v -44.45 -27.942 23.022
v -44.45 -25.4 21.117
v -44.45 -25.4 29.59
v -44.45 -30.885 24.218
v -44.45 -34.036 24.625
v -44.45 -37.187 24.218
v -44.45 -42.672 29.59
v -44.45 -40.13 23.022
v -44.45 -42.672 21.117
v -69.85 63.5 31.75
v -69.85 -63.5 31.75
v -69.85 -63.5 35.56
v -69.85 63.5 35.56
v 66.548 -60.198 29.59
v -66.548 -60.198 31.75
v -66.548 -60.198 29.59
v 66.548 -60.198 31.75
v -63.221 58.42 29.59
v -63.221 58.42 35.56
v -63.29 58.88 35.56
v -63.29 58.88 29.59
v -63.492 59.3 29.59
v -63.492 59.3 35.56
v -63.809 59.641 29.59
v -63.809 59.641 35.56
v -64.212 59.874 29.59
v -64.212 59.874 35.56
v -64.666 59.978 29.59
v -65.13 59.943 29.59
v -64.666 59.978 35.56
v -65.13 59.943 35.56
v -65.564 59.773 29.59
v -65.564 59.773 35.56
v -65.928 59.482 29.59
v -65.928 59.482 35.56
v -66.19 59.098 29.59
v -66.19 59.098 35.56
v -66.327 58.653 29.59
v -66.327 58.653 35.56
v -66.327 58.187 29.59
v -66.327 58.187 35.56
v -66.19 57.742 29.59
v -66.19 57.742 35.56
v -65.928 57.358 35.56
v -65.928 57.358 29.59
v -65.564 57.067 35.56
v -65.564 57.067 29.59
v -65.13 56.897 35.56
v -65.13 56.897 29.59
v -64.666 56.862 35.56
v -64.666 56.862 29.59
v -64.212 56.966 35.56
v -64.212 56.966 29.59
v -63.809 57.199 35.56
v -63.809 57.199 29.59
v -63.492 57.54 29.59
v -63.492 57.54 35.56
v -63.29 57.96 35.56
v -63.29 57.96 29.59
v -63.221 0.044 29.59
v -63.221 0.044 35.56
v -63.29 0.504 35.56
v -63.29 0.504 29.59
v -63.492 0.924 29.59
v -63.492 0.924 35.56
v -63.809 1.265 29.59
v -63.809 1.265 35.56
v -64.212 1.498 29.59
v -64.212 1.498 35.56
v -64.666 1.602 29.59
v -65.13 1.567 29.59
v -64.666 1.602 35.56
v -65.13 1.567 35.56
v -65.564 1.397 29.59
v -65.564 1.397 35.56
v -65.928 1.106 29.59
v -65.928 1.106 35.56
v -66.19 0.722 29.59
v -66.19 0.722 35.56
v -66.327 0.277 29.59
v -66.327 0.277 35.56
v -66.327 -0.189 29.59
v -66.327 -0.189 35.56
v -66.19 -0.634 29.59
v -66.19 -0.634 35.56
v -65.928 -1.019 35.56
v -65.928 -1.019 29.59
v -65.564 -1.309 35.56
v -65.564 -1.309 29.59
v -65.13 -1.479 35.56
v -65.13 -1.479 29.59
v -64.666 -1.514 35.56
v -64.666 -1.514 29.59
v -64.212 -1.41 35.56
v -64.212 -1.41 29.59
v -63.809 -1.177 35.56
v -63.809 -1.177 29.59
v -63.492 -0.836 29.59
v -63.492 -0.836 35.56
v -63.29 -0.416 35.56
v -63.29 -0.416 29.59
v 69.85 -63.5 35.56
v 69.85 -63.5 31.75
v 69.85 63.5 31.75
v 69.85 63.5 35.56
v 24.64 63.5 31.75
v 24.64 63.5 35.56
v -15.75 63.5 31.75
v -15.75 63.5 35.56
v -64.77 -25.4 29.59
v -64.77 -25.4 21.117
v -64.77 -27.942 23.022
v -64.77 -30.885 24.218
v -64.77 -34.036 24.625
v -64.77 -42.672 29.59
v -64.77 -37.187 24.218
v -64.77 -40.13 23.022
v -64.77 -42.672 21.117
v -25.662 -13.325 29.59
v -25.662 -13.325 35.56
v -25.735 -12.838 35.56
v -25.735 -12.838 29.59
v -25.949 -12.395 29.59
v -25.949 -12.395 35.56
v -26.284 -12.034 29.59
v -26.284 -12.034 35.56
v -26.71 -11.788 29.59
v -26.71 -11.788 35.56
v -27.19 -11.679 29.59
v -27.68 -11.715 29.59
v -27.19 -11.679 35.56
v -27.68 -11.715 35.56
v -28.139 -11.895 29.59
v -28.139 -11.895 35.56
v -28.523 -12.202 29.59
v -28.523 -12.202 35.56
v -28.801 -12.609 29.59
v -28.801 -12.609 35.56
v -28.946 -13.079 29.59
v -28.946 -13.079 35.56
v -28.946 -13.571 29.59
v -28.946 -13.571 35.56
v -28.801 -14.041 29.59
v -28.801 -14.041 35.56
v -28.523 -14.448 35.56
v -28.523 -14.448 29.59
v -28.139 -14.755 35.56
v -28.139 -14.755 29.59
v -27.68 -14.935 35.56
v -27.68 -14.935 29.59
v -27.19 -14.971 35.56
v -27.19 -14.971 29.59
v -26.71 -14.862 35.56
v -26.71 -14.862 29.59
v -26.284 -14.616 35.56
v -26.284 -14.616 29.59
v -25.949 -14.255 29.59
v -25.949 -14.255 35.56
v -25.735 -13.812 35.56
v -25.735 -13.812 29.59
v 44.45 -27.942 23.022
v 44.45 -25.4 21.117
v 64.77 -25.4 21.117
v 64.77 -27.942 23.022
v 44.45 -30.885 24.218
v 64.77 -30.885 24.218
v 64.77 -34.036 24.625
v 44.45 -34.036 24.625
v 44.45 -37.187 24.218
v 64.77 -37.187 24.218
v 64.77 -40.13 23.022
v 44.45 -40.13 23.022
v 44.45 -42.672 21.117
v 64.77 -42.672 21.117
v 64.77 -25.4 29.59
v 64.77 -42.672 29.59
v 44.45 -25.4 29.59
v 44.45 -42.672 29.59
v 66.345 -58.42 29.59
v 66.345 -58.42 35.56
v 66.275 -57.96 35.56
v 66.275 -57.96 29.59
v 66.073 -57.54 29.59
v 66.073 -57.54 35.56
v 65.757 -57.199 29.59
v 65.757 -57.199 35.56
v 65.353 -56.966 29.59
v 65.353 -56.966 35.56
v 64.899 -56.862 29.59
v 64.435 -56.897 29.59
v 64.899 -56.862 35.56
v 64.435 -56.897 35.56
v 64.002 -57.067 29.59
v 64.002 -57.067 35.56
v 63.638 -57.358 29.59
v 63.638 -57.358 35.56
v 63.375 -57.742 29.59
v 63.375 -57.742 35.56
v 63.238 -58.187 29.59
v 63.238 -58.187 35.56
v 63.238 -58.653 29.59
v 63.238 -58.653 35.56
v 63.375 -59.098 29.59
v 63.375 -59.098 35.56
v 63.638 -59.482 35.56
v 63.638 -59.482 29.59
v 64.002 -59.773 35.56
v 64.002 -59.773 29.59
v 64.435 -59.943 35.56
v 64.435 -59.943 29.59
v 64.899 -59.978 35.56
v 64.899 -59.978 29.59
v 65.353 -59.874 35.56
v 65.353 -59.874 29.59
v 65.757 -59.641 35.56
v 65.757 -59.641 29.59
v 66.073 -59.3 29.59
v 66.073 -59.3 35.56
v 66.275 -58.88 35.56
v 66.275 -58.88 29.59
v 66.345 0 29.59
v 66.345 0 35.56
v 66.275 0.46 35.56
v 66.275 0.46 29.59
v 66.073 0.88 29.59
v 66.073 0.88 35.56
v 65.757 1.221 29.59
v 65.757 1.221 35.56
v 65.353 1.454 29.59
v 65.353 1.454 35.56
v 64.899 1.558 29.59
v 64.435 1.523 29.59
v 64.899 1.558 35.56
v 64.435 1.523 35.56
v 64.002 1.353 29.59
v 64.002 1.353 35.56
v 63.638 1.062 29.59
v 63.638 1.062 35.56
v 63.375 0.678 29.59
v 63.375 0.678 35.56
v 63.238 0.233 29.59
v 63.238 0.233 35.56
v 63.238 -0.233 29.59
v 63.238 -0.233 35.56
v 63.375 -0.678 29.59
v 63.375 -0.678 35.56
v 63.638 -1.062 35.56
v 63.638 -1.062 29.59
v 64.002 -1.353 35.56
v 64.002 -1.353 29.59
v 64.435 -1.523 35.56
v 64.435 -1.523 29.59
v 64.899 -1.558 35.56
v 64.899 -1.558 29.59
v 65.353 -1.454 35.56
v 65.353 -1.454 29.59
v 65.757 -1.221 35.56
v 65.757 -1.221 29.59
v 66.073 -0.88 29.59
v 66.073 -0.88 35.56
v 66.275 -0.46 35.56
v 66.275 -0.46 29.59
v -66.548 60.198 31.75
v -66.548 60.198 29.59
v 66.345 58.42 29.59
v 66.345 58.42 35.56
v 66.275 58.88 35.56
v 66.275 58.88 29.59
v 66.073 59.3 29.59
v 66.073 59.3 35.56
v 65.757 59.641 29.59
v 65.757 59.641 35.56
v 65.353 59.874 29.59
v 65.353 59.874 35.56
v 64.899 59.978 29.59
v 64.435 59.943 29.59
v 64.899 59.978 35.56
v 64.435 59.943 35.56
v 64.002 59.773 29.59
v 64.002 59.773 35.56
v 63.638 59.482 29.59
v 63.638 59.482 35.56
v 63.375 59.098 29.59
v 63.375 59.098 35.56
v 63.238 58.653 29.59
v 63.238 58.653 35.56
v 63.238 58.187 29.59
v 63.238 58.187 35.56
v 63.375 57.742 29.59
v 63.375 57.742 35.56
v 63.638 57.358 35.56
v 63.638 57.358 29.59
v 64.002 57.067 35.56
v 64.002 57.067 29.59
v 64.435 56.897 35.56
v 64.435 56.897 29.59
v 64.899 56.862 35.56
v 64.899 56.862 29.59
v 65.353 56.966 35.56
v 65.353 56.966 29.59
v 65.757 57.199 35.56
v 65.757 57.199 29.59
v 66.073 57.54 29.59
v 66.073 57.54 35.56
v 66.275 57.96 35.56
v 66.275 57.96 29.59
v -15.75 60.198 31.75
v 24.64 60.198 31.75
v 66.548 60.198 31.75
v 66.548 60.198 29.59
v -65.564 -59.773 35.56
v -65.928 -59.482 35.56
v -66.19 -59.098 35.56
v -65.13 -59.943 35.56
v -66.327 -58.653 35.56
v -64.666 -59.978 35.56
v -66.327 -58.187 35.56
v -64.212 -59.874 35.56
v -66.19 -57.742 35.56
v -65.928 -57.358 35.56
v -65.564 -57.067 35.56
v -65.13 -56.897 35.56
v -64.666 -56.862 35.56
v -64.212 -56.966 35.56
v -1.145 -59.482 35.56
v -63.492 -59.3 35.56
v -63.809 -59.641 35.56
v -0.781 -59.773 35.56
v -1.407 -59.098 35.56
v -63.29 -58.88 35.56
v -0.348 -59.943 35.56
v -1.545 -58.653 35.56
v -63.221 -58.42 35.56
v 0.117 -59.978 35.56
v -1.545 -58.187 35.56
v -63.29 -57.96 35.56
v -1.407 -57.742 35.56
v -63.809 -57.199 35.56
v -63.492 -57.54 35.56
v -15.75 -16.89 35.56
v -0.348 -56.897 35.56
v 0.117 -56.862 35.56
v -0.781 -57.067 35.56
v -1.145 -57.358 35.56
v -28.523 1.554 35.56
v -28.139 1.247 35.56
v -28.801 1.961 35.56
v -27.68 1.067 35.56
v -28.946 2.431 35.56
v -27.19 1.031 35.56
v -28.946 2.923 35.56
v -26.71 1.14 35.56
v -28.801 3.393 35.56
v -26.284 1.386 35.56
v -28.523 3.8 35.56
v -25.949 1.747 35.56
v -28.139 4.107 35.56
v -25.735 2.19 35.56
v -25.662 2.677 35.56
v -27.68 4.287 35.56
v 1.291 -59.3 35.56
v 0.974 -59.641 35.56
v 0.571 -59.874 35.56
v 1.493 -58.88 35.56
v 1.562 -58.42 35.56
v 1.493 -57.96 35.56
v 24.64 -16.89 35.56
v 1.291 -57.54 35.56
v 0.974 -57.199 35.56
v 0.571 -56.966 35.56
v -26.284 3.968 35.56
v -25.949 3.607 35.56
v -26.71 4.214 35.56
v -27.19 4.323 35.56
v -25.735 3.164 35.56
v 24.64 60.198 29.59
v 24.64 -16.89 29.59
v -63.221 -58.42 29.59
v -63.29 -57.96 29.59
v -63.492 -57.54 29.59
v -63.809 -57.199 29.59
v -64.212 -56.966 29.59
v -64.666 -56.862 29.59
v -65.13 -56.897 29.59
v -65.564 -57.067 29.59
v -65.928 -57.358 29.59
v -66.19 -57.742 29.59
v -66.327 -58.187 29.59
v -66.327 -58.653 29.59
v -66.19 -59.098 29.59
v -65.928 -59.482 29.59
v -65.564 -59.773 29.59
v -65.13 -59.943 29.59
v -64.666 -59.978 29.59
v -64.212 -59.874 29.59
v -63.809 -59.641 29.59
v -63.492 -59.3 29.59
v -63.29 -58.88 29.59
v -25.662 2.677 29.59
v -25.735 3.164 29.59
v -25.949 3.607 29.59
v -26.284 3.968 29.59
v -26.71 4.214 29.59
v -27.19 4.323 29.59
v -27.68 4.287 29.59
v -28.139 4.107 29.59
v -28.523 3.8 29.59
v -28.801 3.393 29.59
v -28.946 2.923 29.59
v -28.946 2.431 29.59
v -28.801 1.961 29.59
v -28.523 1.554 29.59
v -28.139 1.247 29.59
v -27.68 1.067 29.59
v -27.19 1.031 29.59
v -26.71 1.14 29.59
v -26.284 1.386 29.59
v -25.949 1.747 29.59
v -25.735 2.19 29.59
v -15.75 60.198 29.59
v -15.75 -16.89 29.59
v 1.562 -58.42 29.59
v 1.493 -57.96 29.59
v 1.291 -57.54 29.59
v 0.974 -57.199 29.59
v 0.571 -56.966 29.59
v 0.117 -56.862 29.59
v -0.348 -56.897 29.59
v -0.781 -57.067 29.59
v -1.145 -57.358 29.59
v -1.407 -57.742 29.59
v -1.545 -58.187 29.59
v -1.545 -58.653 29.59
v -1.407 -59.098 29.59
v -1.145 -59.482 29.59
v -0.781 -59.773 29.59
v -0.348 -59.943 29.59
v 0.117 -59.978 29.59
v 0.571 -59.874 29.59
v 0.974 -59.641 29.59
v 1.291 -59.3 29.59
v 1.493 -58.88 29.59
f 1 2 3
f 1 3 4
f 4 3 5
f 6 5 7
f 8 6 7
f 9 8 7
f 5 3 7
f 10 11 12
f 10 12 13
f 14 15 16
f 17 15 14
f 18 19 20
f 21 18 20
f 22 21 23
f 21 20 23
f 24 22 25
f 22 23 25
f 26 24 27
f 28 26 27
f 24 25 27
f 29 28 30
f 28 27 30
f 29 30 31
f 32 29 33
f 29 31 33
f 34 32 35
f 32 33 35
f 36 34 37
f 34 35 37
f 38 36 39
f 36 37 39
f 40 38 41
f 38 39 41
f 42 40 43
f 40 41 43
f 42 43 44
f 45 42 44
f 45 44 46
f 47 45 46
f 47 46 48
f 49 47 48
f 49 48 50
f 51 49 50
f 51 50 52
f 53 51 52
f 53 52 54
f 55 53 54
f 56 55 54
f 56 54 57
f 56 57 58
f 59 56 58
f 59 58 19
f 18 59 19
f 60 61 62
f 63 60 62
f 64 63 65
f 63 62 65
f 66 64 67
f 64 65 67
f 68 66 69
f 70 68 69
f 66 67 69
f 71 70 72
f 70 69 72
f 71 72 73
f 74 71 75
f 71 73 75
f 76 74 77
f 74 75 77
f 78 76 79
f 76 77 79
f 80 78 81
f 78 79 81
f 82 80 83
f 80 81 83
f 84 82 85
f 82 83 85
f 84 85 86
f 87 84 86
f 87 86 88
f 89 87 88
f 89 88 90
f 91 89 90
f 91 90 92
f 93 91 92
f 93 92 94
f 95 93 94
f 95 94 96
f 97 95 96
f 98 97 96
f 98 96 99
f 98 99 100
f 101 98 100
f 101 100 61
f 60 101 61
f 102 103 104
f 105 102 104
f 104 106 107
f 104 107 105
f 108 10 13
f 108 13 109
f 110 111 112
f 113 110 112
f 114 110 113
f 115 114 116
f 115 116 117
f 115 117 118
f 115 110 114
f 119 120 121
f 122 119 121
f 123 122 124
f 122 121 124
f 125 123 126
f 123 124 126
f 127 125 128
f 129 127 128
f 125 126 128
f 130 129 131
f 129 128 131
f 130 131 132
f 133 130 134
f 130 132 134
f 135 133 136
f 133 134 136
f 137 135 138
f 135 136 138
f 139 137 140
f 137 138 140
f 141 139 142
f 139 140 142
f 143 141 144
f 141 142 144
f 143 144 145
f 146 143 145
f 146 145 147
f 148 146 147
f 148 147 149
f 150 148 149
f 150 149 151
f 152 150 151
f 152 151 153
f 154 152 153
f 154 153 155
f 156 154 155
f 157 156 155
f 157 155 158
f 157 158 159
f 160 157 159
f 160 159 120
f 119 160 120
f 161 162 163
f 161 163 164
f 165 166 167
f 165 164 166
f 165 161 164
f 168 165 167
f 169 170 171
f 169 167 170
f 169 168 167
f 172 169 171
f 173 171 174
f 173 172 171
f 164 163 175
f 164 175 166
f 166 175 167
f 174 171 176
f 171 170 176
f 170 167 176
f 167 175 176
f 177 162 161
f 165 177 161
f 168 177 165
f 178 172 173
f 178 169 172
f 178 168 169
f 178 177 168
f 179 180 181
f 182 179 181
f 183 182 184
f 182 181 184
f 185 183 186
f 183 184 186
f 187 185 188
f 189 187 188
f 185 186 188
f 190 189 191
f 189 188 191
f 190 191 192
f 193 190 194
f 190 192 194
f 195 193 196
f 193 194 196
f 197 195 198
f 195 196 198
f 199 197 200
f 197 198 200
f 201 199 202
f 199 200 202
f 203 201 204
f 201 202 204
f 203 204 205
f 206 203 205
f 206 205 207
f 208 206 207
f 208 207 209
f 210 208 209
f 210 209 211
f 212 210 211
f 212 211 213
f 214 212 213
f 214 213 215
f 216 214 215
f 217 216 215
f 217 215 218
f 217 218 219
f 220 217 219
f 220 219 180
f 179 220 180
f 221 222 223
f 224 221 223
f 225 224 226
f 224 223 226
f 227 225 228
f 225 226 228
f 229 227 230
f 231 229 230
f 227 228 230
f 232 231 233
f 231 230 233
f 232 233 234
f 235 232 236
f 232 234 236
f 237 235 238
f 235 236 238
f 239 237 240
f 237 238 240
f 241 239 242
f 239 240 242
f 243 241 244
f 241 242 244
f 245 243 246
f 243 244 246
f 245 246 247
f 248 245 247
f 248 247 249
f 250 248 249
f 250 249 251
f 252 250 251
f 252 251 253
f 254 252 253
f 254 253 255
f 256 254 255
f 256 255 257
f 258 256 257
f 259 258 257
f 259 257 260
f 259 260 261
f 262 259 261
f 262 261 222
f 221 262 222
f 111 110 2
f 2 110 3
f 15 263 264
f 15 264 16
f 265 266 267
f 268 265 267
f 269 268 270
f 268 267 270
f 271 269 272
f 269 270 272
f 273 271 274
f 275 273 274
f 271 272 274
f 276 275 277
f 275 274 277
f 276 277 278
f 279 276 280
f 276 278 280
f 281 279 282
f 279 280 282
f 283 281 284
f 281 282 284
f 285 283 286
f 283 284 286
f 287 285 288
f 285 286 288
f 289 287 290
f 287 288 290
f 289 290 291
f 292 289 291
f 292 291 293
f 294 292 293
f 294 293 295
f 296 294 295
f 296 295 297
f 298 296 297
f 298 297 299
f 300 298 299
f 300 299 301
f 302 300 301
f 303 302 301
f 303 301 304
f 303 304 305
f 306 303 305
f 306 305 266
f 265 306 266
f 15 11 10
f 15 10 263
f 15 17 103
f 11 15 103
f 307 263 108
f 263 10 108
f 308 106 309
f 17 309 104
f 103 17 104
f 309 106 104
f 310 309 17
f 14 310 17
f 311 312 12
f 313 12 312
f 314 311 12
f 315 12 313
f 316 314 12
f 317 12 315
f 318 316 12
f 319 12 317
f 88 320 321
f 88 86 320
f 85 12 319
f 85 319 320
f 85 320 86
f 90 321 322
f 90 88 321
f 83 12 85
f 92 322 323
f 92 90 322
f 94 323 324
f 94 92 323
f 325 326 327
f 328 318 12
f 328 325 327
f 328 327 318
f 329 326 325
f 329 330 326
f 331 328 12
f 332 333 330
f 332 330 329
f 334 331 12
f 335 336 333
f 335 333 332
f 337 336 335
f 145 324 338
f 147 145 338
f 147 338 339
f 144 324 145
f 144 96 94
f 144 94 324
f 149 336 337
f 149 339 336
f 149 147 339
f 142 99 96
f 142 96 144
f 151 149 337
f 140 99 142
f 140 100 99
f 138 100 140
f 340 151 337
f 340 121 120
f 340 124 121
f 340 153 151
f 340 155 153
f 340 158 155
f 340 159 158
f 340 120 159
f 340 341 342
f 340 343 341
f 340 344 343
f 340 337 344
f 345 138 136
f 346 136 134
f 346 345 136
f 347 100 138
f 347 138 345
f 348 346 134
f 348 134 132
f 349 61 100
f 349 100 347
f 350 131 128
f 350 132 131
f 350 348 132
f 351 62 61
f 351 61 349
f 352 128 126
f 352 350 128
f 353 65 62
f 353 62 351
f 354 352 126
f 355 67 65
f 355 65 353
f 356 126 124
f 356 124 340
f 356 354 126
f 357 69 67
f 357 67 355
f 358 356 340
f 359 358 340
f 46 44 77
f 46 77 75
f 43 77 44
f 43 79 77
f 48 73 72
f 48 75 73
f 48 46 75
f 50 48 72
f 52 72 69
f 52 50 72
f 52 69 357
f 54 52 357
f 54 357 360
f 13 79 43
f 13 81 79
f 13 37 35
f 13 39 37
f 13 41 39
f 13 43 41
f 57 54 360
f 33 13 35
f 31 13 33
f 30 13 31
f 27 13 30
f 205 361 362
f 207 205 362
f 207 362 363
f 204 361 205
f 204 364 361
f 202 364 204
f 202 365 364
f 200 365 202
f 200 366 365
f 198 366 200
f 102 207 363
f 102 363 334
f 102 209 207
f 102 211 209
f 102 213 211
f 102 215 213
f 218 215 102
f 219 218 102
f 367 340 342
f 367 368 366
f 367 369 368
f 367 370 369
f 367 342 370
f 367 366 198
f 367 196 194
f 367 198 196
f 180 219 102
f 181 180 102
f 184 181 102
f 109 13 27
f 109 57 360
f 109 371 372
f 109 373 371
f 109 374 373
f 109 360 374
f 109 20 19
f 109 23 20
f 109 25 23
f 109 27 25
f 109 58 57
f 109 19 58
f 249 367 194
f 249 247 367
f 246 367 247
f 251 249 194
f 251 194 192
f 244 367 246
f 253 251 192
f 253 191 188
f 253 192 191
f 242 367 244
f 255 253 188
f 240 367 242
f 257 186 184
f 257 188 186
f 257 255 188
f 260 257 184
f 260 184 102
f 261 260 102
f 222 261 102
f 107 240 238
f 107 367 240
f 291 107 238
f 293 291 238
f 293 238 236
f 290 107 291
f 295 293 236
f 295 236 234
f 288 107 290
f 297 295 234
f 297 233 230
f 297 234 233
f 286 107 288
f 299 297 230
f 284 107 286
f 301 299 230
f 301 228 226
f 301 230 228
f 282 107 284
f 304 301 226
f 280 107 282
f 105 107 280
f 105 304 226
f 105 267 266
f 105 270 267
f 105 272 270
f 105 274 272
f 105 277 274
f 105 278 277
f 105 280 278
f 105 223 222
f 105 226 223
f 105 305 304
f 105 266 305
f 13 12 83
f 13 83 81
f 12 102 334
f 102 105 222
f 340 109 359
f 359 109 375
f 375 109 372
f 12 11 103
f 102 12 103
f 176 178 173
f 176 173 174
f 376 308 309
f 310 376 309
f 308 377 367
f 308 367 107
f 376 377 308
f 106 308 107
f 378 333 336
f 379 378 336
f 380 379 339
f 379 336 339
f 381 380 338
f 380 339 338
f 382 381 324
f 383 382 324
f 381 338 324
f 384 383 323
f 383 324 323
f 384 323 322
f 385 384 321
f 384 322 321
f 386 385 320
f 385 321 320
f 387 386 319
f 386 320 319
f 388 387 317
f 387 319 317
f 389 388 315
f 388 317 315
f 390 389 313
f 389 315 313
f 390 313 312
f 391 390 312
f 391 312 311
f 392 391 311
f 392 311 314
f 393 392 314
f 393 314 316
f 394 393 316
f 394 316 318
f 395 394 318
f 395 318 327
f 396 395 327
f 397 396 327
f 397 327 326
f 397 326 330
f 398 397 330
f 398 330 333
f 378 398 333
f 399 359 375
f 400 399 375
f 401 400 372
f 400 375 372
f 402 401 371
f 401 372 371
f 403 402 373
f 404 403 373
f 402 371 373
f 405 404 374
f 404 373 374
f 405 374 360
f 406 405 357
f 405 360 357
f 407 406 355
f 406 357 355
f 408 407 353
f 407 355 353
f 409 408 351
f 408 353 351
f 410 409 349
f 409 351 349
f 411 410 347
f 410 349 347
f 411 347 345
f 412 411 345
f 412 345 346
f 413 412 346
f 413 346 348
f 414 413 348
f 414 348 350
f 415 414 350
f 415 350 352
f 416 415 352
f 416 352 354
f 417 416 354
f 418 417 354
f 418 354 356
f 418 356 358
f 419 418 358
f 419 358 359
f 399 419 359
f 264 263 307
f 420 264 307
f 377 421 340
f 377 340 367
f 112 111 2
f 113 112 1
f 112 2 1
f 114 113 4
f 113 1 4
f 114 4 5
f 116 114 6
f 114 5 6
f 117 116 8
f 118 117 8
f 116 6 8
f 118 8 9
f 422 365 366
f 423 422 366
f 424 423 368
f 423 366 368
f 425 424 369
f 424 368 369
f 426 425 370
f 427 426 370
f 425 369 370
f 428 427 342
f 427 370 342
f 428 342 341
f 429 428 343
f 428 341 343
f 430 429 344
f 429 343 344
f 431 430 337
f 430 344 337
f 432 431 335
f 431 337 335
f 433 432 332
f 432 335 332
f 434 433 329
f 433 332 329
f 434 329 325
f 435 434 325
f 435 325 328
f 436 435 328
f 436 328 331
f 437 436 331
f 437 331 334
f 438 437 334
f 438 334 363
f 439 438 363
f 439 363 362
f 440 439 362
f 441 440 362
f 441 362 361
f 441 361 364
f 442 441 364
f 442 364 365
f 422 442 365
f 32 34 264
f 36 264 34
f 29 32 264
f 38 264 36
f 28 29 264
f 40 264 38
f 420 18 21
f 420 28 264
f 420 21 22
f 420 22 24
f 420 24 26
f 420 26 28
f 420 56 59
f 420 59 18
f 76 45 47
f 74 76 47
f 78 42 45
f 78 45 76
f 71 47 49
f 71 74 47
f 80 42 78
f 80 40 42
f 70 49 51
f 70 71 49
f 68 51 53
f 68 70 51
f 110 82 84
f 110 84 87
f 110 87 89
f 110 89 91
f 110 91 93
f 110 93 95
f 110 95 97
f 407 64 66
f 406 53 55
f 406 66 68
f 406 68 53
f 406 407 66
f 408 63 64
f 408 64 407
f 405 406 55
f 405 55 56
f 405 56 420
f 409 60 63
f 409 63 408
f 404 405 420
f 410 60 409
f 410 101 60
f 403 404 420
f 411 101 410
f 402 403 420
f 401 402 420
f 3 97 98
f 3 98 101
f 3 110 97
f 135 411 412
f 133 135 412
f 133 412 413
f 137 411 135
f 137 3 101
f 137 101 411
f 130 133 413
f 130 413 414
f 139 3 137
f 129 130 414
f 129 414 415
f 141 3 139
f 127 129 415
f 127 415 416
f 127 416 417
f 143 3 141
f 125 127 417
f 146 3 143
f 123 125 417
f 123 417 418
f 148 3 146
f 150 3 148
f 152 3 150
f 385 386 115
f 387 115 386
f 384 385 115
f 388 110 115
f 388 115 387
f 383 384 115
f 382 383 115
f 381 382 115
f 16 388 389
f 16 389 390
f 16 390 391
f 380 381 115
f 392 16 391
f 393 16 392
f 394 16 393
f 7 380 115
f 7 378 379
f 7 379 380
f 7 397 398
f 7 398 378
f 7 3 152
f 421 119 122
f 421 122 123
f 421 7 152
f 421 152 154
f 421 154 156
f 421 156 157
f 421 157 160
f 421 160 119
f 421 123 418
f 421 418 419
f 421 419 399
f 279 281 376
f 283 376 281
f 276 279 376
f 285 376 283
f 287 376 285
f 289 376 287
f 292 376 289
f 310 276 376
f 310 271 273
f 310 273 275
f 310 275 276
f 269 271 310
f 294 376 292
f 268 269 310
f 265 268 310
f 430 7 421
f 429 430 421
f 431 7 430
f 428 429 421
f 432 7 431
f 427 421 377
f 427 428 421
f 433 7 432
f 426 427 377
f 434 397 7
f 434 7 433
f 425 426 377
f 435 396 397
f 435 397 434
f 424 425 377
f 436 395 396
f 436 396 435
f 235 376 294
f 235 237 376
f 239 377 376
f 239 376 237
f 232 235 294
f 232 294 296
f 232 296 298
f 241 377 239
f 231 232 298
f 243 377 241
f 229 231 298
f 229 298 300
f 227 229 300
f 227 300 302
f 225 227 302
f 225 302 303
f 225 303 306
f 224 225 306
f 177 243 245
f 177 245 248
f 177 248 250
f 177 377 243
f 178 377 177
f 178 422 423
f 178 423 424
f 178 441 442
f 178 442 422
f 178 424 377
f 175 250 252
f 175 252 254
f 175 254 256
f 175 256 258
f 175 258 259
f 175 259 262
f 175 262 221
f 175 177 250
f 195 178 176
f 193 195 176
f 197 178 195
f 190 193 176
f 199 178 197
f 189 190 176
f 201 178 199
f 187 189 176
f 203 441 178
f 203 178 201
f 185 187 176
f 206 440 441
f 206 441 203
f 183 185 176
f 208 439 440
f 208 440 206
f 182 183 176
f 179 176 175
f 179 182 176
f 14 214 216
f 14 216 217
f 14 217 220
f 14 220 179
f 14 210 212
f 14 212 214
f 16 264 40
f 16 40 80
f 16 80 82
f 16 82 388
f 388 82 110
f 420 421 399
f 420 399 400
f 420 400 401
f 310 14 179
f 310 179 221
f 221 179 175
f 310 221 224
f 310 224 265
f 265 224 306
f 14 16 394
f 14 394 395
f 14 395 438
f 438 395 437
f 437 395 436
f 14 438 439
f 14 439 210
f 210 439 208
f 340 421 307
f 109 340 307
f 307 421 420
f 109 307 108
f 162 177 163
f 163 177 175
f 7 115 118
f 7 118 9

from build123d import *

# Parameters (mm, degrees)
BOX_W                = 40.39
BOX_H                = 86.36
BOX_DEPTH            = 25.4
SKETCH045_W          = 139.7
SKETCH045_H          = 127
PAD022_DEPTH         = 3.81
SKETCH046_W          = 133.096
SKETCH046_H          = 120.396
PAD023_DEPTH         = 2.16
SKETCH013_R          = 1.5621
SKETCH013_R_2        = 1.651
POCKET019_DEPTH      = 5.971
SKETCH047_W          = 20.32
SKETCH047_H          = 17.272
PAD024_DEPTH         = 12.7
SKETCH048_R          = 12.3825
POCKET020_DEPTH      = 69.851
POCKET020_DEPTH_BACK = 69.851


with BuildPart() as top_removal:
    # Box → Box (new body)
    with BuildSketch(Plane(origin=(-15.75, -16.89, 13.87), x_dir=(1, 0, 0), z_dir=(0, 0, 1))):
        with Locations((20.195, 43.18)):
            Rectangle(BOX_W, BOX_H)
    extrude(amount=BOX_DEPTH)


with BuildPart() as top_cover:
    # Sketch045 → Pad022 (new body)
    with BuildSketch(Plane.XY.offset(31.75)):
        Rectangle(SKETCH045_W, SKETCH045_H)
    extrude(amount=PAD022_DEPTH)

    # Sketch046 (on Face5 of Pad022) → Pad023 (join)
    with BuildSketch(Plane(origin=(0, 0, 31.75), x_dir=(1, 0, 0), z_dir=(0, 0, -1))):
        Rectangle(SKETCH046_W, SKETCH046_H)
    extrude(amount=PAD023_DEPTH)

    # Sketch013 (on Face5 of Pad023) → Pocket019 (cut, through all)
    with BuildSketch(Plane.XY.offset(35.56)):
        with Locations((64.7827376585, 58.42)):
            Circle(SKETCH013_R)
        with Locations((64.7827376585, 0)):
            Circle(SKETCH013_R)
        with Locations((64.7827376585, -58.42)):
            Circle(SKETCH013_R)
        with Locations((0, 58.42)):
            Circle(SKETCH013_R)
        with Locations((-64.7827376585, 58.42)):
            Circle(SKETCH013_R)
        with Locations((-64.7827376585, 0.043989)):
            Circle(SKETCH013_R)
        with Locations((-64.7827376585, -58.42)):
            Circle(SKETCH013_R)
        with Locations((0, -58.42)):
            Circle(SKETCH013_R)
        with Locations((-27.313105, 2.676934)):
            Circle(SKETCH013_R_2)
        with Locations((-27.313105, -13.325066)):
            Circle(SKETCH013_R_2)
    extrude(amount=-POCKET019_DEPTH, mode=Mode.SUBTRACT)

    # Sketch047 (on Face21 of Pocket019) → Pad024 (join)
    with BuildSketch(Plane(origin=(0, 0, 29.59), x_dir=(1, 0, 0), z_dir=(0, 0, -1))):
        with Locations((-54.61, 34.036)):
            Rectangle(SKETCH047_W, SKETCH047_H)
        with Locations((54.61, 34.036)):
            Rectangle(SKETCH047_W, SKETCH047_H)
    extrude(amount=PAD024_DEPTH)

    # Sketch048 → Pocket020 (cut, two sides)
    with BuildSketch(Plane.YZ) as pocket020_sk:
        with Locations((-34.036, 12.2428)):
            Circle(SKETCH048_R)
    extrude(amount=-POCKET020_DEPTH, mode=Mode.SUBTRACT)
    extrude(pocket020_sk.sketch, amount=POCKET020_DEPTH_BACK, mode=Mode.SUBTRACT)

    # Cut: cut top_removal
    add(top_removal.part, mode=Mode.SUBTRACT)


solid = top_cover.part
